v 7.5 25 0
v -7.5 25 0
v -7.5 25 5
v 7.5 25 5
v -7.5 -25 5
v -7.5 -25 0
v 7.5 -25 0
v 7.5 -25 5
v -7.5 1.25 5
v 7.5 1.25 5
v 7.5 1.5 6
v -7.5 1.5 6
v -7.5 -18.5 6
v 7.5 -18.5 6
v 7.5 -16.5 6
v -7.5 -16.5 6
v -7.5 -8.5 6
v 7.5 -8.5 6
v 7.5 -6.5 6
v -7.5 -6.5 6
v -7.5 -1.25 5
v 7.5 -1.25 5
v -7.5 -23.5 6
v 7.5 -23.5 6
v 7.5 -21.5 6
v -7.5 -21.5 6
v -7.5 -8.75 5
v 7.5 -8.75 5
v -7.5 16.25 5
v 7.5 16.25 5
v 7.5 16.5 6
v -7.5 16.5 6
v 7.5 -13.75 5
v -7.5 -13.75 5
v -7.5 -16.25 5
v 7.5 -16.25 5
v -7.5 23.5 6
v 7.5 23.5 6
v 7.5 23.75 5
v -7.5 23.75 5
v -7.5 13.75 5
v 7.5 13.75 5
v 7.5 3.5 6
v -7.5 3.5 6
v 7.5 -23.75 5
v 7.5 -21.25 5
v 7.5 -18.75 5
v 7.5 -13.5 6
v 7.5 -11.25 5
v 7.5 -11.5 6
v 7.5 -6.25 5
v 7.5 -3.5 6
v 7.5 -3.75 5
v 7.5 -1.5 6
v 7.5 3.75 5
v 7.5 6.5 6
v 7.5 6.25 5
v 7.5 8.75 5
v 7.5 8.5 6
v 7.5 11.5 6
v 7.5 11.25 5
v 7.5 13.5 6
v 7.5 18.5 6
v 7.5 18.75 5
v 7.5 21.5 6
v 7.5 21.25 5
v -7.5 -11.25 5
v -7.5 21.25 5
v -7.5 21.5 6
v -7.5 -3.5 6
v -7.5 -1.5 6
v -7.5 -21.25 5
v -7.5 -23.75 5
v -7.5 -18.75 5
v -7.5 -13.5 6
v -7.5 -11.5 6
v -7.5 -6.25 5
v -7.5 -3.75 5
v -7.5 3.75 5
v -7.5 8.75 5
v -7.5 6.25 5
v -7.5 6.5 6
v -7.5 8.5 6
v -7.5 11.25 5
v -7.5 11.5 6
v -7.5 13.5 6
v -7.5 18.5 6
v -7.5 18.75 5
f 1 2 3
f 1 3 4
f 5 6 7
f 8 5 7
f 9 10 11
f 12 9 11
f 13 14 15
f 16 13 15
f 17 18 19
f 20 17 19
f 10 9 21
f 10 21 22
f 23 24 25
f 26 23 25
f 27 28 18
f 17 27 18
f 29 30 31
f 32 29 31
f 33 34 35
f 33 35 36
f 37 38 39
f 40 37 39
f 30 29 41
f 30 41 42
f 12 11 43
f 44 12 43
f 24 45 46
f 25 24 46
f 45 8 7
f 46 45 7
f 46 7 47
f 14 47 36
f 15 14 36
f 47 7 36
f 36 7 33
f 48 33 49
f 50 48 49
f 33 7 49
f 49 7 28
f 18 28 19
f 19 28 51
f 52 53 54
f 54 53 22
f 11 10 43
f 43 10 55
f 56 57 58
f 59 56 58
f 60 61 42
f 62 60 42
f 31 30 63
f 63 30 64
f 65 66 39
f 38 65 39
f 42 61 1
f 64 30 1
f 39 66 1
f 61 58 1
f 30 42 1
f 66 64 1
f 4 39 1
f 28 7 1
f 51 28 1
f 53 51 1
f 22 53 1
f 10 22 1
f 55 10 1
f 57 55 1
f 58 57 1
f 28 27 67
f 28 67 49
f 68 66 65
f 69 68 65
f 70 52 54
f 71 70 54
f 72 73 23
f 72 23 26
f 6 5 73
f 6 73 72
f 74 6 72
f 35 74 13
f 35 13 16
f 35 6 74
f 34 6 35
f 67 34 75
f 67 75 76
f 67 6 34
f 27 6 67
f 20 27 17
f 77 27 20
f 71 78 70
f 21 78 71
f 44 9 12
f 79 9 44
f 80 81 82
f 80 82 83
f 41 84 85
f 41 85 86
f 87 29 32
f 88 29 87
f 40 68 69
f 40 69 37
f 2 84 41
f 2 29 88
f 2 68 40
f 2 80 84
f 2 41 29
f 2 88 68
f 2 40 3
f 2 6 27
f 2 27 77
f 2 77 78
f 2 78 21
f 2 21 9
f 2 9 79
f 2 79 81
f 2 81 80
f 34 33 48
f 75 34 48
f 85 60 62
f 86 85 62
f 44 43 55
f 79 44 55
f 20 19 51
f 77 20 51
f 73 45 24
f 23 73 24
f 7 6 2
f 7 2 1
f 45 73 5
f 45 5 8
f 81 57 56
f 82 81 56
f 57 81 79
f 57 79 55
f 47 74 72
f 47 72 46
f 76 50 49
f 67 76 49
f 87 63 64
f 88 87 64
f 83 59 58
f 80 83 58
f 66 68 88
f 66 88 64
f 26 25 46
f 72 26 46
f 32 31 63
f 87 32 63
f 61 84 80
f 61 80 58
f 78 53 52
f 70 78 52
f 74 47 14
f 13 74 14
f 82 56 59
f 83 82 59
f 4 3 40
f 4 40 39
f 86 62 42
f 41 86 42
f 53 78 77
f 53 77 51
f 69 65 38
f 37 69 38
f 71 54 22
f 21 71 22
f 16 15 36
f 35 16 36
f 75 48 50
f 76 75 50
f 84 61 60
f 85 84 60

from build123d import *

# Parameters (mm, degrees)
SKETCH_W     = 15
SKETCH_H     = 50
PAD_DEPTH    = 5
PAD001_DEPTH = 15


with BuildPart() as part:
    # Sketch → Pad (new body)
    with BuildSketch(Plane.XY):
        Rectangle(SKETCH_W, SKETCH_H)
    extrude(amount=PAD_DEPTH)

    # Sketch001 (on Face3 of Pad) → Pad001 (join)
    with BuildSketch(Plane.YZ.offset(7.5)):
        Polygon((-23.75, 5), (-23.5, 6), (-21.5, 6), (-21.25, 5), align=None)
        Polygon((-18.75, 5), (-18.5, 6), (-16.5, 6), (-16.25, 5), align=None)
        Polygon((-13.75, 5), (-13.5, 6), (-11.5, 6), (-11.25, 5), align=None)
        Polygon((-8.75, 5), (-8.5, 6), (-6.5, 6), (-6.25, 5), align=None)
        Polygon((-3.75, 5), (-3.5, 6), (-1.5, 6), (-1.25, 5), align=None)
        Polygon((1.25, 5), (1.5, 6), (3.5, 6), (3.75, 5), align=None)
        Polygon((6.25, 5), (6.5, 6), (8.5, 6), (8.75, 5), align=None)
        Polygon((11.25, 5), (11.5, 6), (13.5, 6), (13.75, 5), align=None)
        Polygon((16.25, 5), (16.5, 6), (18.5, 6), (18.75, 5), align=None)
        Polygon((21.25, 5), (21.5, 6), (23.5, 6), (23.75, 5), align=None)
    extrude(amount=-PAD001_DEPTH)


solid = part.part
